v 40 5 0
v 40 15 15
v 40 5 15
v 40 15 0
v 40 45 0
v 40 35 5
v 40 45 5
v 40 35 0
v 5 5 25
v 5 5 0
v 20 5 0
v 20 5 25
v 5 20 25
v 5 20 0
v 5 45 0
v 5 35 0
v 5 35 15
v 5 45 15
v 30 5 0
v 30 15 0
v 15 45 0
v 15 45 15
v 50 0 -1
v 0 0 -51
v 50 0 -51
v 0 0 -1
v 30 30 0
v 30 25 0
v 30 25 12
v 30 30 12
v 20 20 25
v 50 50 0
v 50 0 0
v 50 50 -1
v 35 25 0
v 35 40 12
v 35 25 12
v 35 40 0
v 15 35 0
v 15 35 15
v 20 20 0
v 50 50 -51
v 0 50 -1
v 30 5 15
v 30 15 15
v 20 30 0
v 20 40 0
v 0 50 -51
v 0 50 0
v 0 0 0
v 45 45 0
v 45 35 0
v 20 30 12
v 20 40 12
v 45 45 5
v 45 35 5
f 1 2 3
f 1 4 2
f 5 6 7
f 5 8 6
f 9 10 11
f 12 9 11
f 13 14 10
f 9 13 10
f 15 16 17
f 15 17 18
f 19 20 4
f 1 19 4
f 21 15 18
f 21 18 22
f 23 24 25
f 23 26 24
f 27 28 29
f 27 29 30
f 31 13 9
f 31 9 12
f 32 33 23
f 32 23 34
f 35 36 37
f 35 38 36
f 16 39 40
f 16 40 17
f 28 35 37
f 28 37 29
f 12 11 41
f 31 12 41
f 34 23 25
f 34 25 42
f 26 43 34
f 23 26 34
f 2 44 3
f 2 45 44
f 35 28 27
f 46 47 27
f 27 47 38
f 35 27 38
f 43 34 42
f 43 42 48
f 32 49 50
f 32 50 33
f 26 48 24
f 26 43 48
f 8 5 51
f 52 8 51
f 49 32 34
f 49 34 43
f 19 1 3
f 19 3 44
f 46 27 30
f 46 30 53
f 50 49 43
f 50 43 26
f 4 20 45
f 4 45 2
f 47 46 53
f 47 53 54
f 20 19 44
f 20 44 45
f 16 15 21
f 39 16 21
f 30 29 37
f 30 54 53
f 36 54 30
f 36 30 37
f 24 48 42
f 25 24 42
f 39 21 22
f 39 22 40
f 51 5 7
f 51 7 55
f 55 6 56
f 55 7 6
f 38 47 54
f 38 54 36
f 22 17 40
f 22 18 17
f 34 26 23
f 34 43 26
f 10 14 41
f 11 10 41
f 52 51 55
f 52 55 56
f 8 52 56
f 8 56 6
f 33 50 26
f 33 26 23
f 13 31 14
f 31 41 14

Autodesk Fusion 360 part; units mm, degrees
sketch "Skizze1" plane through (0, 0, 0) normal (0, 0, 1) x (1, 0, 0)
  line L0 (0, 0) -> (50, 0)
  line L1 (50, 0) -> (50, 50)
  line L2 (50, 50) -> (0, 50)
  line L3 (0, 50) -> (0, 0)
  line L4 (20, 20) -> (5, 20)
  line L5 (5, 20) -> (5, 5)
  line L6 (5, 5) -> (20, 5)
  line L7 (20, 5) -> (20, 20)
  line L8 (20, 40) -> (35, 40)
  line L9 (35, 40) -> (35, 25)
  line L10 (35, 25) -> (30, 25)
  line L11 (30, 25) -> (30, 30)
  line L12 (30, 30) -> (20, 30)
  line L13 (20, 30) -> (20, 40)
  line L14 (5, 45) -> (15, 45)
  line L15 (15, 45) -> (15, 35)
  line L16 (15, 35) -> (5, 35)
  line L17 (5, 35) -> (5, 45)
  line L18 (30, 15) -> (40, 15)
  line L19 (40, 15) -> (40, 5)
  line L20 (40, 5) -> (30, 5)
  line L21 (30, 5) -> (30, 15)
  line L22 (40, 45) -> (45, 45)
  line L23 (45, 45) -> (45, 35)
  line L24 (45, 35) -> (40, 35)
  line L25 (40, 35) -> (40, 45)
extrude "Extrusion1" add sketch "Skizze1" along normal blind 25 contours L4 L5 L6 L7 makes body 1 in component "Großer Block"
extrude "Extrusion1'" add sketch "Skizze1" along normal blind 15 separate body contours L18 L19 L20 L21 makes body 2 in component "Medium Block 1"
extrude "Extrusion1''" add sketch "Skizze1" along normal blind 15 separate body contours L14 L15 L16 L17 makes body 3 in component "Medium Block 2#"
extrude "Extrusion1'''" add sketch "Skizze1" along normal blind 12 separate body contours L8 L9 L10 L11 L12 L13 makes body 4 in component "L Block"
extrude "Extrusion1''''" add sketch "Skizze1" along normal blind 5 separate body contours L22 L23 L24 L25 makes body 5 in component "Smal Block 1"
extrude "Extrusion1'''''" add sketch "Skizze1" against normal blind 1 separate body contours L0 L1 L2 L3 | L4 L5 L6 L7 | L8 L9 L10 L11 L12 L13 | L14 L15 L16 L17 | L18 L19 L20 L21 | L22 L23 L24 L25 makes body 6 in component "Boden"
extrude "Extrusion1''''''" add 1 faces at (16.6667, 33.3333, -1) along direction (0, 0, -1) blind 50 separate body on bodies 6 makes body 7 in component "Ground below"
component "Großer Block" placed x (1, 0, 0) y (0, 1, 0) z (0, 0, 1) at (0, 0, 0)
component "Medium Block 1" placed x (1, 0, 0) y (0, 1, 0) z (0, 0, 1) at (0, 0, 0)
component "Medium Block 2#" placed x (1, 0, 0) y (0, 1, 0) z (0, 0, 1) at (0, 0, 0)
component "L Block" placed x (1, 0, 0) y (0, 1, 0) z (0, 0, 1) at (0, 0, 0)
component "Smal Block 1" placed x (1, 0, 0) y (0, 1, 0) z (0, 0, 1) at (0, 0, 0)
component "Boden" placed x (1, 0, 0) y (0, 1, 0) z (0, 0, 1) at (0, 0, 0)
component "Ground below" placed x (1, 0, 0) y (0, 1, 0) z (0, 0, 1) at (0, 0, 0)
